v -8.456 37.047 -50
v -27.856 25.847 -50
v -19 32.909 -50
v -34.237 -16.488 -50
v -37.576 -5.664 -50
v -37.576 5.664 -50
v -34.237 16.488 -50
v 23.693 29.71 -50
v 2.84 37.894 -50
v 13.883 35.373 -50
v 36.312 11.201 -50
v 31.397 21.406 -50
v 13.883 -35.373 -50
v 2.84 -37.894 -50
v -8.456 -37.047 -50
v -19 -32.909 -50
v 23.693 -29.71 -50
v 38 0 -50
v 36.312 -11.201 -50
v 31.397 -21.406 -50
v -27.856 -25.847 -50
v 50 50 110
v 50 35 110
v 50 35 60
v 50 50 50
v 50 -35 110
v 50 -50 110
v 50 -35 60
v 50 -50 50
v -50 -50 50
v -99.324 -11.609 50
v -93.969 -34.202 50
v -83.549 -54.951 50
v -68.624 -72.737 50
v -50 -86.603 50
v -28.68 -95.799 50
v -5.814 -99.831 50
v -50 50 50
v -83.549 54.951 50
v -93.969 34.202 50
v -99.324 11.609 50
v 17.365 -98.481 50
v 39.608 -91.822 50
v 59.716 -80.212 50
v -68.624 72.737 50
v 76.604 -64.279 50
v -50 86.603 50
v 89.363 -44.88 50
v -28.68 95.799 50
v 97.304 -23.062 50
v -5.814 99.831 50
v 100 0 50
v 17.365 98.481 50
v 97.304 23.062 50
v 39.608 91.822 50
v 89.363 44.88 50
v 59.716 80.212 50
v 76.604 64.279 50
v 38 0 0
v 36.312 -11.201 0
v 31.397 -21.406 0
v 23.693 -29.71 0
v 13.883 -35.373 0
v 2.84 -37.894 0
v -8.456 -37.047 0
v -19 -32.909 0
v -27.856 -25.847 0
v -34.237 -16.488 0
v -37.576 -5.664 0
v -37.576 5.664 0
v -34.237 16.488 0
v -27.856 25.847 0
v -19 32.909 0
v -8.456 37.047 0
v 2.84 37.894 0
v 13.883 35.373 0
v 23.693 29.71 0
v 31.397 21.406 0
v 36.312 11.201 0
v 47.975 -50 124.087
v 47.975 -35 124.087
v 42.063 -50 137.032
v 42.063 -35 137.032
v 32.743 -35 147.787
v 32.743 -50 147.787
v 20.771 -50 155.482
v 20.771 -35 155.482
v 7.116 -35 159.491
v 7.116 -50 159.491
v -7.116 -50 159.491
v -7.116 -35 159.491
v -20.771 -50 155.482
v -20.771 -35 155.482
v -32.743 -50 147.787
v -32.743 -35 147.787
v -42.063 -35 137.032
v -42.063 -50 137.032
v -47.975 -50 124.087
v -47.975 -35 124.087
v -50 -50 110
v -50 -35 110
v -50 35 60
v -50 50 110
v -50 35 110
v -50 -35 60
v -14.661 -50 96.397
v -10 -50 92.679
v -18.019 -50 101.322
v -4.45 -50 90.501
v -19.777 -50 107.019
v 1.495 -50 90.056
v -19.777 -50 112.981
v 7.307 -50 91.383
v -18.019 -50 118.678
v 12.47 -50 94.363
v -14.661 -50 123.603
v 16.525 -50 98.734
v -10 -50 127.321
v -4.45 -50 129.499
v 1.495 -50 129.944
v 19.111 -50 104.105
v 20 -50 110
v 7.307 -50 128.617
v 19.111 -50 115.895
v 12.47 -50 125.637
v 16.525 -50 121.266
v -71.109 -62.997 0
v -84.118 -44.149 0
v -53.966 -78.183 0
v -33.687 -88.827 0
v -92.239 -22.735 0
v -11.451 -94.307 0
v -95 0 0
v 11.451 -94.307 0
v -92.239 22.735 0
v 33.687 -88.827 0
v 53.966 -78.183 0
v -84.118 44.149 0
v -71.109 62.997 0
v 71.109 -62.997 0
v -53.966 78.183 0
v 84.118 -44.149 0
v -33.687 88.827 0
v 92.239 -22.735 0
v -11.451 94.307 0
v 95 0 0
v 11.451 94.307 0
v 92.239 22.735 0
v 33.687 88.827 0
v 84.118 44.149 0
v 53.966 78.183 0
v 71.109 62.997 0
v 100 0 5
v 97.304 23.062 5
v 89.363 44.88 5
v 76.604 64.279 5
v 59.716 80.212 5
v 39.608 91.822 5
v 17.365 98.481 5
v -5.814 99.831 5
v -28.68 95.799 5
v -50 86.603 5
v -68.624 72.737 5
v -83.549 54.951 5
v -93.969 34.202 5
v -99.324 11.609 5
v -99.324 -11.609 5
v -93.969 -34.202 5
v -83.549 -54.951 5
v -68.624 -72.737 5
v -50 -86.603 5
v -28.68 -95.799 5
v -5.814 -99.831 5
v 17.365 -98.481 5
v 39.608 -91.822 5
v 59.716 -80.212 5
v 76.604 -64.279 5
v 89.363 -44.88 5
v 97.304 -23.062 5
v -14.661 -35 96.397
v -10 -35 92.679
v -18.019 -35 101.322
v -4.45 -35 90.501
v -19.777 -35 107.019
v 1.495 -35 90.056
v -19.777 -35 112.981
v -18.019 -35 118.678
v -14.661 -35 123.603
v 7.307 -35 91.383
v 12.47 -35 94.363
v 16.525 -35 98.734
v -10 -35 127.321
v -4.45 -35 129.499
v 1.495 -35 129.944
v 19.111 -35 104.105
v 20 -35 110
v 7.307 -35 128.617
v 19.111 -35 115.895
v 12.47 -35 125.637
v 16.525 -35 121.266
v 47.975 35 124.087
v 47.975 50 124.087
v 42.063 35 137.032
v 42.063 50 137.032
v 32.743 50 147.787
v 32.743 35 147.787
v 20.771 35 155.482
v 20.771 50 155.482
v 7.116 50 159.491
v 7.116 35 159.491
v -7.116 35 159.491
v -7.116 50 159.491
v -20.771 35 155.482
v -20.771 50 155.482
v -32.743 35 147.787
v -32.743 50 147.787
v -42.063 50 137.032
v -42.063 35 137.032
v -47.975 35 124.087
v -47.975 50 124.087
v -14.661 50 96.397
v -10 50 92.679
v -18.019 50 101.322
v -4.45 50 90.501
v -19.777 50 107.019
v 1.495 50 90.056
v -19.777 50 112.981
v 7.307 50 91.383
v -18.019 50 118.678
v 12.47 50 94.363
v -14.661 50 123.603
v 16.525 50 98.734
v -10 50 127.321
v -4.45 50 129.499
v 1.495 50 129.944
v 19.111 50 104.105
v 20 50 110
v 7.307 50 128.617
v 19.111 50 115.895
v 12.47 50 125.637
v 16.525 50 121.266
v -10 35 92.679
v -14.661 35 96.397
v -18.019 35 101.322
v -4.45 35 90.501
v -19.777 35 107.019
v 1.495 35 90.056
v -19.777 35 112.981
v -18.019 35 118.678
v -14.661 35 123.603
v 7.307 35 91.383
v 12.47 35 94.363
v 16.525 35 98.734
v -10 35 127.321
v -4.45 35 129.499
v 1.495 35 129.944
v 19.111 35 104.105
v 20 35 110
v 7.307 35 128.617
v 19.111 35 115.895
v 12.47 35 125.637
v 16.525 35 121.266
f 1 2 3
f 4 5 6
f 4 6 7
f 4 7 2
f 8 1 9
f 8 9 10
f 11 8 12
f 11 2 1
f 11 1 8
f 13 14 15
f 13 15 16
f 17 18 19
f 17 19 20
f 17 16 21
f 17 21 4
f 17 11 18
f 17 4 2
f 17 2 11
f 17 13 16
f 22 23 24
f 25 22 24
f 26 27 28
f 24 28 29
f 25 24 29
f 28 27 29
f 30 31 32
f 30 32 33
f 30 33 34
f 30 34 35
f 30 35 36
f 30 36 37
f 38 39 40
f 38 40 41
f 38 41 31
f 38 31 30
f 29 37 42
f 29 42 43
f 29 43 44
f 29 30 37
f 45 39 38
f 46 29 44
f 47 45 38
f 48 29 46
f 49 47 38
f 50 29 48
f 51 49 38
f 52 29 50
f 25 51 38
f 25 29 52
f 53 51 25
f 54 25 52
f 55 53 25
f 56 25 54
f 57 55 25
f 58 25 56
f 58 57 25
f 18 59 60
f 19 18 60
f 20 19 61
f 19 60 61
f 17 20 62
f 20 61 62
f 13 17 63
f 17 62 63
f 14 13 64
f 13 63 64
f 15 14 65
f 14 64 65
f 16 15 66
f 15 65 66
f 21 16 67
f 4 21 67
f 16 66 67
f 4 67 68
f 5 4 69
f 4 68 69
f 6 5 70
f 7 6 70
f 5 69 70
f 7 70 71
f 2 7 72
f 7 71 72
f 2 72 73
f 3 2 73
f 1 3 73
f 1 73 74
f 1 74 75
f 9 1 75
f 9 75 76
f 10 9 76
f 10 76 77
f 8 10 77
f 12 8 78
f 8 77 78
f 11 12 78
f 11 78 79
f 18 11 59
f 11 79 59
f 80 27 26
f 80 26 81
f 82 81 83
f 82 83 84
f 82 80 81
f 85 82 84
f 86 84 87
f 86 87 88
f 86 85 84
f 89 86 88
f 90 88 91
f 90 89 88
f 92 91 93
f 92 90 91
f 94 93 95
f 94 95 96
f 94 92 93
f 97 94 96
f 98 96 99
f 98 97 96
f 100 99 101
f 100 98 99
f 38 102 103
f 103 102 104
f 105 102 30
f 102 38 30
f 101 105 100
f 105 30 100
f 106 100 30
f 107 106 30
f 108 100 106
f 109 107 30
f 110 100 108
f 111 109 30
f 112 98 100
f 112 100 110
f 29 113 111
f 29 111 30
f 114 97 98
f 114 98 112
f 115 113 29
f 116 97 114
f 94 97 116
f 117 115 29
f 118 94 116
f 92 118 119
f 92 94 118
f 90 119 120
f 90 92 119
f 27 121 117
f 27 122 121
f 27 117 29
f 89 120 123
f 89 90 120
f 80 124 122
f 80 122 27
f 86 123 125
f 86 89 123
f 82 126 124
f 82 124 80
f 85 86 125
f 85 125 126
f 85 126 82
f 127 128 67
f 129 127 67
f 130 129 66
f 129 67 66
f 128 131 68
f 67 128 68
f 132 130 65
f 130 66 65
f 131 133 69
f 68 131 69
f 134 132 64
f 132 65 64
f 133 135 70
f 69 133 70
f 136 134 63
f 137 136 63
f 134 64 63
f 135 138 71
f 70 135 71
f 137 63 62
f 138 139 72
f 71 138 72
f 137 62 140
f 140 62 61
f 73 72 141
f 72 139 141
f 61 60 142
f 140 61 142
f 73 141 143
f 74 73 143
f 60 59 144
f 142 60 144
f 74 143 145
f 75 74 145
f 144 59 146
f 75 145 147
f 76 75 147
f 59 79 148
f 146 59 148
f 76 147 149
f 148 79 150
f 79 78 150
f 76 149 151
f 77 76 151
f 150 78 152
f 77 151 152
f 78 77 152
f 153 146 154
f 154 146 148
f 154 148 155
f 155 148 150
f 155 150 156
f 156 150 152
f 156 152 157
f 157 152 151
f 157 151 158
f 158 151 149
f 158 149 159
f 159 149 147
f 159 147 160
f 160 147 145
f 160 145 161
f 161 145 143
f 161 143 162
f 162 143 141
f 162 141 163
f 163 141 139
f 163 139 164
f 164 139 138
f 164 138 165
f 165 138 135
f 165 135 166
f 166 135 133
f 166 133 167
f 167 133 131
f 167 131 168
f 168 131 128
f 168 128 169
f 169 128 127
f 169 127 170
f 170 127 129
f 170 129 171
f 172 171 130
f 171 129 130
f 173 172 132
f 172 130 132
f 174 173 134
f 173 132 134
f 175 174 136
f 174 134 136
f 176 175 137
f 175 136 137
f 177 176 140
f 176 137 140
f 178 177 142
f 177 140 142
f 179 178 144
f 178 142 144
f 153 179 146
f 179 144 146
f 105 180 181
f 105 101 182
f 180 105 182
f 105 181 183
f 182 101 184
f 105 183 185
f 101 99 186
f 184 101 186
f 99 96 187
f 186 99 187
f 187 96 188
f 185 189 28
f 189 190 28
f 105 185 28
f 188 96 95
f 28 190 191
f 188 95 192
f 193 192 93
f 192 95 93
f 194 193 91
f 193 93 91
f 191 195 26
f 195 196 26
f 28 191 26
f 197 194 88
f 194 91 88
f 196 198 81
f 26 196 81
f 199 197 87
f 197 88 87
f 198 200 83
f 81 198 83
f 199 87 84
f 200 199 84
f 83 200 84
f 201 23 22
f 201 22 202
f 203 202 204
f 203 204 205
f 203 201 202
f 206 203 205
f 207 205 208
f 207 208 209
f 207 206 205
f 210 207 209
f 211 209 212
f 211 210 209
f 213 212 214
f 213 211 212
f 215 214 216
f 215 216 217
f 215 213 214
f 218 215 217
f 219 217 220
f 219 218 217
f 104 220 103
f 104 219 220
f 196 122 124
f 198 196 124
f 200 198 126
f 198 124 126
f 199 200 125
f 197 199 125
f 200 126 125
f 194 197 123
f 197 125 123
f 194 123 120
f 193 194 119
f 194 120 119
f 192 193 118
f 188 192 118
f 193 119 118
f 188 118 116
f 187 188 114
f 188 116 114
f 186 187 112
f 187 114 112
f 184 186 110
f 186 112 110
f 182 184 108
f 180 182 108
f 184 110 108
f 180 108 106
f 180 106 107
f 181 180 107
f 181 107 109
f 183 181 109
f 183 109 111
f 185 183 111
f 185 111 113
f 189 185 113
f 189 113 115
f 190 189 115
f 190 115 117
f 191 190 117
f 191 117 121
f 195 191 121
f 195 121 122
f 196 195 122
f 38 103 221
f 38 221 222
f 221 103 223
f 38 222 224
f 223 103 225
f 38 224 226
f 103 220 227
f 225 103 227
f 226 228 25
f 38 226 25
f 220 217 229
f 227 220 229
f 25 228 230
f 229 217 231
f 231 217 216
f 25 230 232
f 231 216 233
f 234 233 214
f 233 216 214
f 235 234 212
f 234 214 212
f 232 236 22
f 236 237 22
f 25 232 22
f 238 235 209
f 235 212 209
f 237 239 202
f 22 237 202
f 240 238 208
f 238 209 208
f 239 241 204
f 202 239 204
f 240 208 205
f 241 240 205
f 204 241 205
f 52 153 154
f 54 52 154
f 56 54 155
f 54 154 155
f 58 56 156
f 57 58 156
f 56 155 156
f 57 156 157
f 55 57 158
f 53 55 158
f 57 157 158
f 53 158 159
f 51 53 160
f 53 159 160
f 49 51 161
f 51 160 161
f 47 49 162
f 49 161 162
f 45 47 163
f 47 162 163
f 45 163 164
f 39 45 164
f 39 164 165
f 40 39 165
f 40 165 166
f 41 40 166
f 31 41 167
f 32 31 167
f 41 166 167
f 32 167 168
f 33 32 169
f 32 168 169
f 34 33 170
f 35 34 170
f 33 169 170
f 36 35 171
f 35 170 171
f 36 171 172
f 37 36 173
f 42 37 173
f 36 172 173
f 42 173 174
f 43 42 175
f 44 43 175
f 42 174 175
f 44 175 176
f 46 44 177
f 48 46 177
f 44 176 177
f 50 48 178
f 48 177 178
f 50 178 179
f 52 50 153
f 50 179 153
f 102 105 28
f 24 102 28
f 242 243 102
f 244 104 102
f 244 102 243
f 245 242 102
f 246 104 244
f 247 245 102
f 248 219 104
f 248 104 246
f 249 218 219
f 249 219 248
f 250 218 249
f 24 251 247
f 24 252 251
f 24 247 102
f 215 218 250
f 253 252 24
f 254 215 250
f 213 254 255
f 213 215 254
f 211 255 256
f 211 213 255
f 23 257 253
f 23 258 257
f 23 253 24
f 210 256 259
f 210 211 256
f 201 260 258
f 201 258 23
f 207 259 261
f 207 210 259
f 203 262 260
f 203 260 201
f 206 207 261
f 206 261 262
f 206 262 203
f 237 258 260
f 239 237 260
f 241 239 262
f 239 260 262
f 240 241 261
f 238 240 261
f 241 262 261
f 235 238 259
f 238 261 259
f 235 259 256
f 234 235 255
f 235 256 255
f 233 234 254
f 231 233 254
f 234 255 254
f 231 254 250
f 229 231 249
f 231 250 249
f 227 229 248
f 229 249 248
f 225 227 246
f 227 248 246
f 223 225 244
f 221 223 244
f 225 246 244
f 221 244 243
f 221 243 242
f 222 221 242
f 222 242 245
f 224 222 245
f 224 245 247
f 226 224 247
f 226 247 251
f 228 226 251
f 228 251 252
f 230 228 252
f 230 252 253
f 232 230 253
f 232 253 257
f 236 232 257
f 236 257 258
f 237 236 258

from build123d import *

# Parameters (mm, degrees)
SKETCH_R        = 100
PAD_DEPTH       = 50
CHAMFER_SIZE    = 5
SKETCH001_R     = 38
PAD001_DEPTH    = 50
SKETCH002_W     = 100
SKETCH002_H     = 100
PAD002_DEPTH    = 10
PAD003_DEPTH    = 50
SKETCH004_R     = 20
POCKET_DEPTH    = 101
SKETCH005_W     = 100
SKETCH005_H     = 101
POCKET001_DEPTH = 35


with BuildPart() as part:
    # Sketch → Pad (new body)
    with BuildSketch(Plane.XY):
        Circle(SKETCH_R)
    extrude(amount=PAD_DEPTH)

    # Chamfer
    chamfer_edges = [part.edges().sort_by_distance(p)[0] for p in [
        (-100, 0, 0),
    ]]
    chamfer(chamfer_edges, length=CHAMFER_SIZE)

    # Sketch001 (on Face4 of Chamfer) → Pad001 (join)
    with BuildSketch(Plane(origin=(0, 0, 0), x_dir=(1, 0, 0), z_dir=(0, 0, -1))):
        Circle(SKETCH001_R)
    extrude(amount=PAD001_DEPTH)

    # Sketch002 (on Face3 of Pad001) → Pad002 (join)
    with BuildSketch(Plane.XY.offset(50)):
        Rectangle(SKETCH002_W, SKETCH002_H)
    extrude(amount=PAD002_DEPTH)

    # Sketch003 → Pad003 (join, symmetric)
    with BuildSketch(Plane.XZ):
        with BuildLine():
            ThreePointArc((50, 110), (0, 160), (-50, 110))
            Line((-50, 60), (-50, 110))
            Line((50, 60), (-50, 60))
            Line((50, 110), (50, 60))
        make_face()
    extrude(amount=PAD003_DEPTH, both=True)

    # Sketch004 (on Face11 of Pad003) → Pocket (cut)
    with BuildSketch(Plane.XZ.offset(50)):
        with Locations((0, 110)):
            Circle(SKETCH004_R)
    extrude(amount=-POCKET_DEPTH, mode=Mode.SUBTRACT)

    # Sketch005 → Pocket001 (cut, symmetric)
    with BuildSketch(Plane.XZ):
        with Locations((0, 110.5)):
            Rectangle(SKETCH005_W, SKETCH005_H)
    extrude(amount=POCKET001_DEPTH, both=True, mode=Mode.SUBTRACT)


solid = part.part
